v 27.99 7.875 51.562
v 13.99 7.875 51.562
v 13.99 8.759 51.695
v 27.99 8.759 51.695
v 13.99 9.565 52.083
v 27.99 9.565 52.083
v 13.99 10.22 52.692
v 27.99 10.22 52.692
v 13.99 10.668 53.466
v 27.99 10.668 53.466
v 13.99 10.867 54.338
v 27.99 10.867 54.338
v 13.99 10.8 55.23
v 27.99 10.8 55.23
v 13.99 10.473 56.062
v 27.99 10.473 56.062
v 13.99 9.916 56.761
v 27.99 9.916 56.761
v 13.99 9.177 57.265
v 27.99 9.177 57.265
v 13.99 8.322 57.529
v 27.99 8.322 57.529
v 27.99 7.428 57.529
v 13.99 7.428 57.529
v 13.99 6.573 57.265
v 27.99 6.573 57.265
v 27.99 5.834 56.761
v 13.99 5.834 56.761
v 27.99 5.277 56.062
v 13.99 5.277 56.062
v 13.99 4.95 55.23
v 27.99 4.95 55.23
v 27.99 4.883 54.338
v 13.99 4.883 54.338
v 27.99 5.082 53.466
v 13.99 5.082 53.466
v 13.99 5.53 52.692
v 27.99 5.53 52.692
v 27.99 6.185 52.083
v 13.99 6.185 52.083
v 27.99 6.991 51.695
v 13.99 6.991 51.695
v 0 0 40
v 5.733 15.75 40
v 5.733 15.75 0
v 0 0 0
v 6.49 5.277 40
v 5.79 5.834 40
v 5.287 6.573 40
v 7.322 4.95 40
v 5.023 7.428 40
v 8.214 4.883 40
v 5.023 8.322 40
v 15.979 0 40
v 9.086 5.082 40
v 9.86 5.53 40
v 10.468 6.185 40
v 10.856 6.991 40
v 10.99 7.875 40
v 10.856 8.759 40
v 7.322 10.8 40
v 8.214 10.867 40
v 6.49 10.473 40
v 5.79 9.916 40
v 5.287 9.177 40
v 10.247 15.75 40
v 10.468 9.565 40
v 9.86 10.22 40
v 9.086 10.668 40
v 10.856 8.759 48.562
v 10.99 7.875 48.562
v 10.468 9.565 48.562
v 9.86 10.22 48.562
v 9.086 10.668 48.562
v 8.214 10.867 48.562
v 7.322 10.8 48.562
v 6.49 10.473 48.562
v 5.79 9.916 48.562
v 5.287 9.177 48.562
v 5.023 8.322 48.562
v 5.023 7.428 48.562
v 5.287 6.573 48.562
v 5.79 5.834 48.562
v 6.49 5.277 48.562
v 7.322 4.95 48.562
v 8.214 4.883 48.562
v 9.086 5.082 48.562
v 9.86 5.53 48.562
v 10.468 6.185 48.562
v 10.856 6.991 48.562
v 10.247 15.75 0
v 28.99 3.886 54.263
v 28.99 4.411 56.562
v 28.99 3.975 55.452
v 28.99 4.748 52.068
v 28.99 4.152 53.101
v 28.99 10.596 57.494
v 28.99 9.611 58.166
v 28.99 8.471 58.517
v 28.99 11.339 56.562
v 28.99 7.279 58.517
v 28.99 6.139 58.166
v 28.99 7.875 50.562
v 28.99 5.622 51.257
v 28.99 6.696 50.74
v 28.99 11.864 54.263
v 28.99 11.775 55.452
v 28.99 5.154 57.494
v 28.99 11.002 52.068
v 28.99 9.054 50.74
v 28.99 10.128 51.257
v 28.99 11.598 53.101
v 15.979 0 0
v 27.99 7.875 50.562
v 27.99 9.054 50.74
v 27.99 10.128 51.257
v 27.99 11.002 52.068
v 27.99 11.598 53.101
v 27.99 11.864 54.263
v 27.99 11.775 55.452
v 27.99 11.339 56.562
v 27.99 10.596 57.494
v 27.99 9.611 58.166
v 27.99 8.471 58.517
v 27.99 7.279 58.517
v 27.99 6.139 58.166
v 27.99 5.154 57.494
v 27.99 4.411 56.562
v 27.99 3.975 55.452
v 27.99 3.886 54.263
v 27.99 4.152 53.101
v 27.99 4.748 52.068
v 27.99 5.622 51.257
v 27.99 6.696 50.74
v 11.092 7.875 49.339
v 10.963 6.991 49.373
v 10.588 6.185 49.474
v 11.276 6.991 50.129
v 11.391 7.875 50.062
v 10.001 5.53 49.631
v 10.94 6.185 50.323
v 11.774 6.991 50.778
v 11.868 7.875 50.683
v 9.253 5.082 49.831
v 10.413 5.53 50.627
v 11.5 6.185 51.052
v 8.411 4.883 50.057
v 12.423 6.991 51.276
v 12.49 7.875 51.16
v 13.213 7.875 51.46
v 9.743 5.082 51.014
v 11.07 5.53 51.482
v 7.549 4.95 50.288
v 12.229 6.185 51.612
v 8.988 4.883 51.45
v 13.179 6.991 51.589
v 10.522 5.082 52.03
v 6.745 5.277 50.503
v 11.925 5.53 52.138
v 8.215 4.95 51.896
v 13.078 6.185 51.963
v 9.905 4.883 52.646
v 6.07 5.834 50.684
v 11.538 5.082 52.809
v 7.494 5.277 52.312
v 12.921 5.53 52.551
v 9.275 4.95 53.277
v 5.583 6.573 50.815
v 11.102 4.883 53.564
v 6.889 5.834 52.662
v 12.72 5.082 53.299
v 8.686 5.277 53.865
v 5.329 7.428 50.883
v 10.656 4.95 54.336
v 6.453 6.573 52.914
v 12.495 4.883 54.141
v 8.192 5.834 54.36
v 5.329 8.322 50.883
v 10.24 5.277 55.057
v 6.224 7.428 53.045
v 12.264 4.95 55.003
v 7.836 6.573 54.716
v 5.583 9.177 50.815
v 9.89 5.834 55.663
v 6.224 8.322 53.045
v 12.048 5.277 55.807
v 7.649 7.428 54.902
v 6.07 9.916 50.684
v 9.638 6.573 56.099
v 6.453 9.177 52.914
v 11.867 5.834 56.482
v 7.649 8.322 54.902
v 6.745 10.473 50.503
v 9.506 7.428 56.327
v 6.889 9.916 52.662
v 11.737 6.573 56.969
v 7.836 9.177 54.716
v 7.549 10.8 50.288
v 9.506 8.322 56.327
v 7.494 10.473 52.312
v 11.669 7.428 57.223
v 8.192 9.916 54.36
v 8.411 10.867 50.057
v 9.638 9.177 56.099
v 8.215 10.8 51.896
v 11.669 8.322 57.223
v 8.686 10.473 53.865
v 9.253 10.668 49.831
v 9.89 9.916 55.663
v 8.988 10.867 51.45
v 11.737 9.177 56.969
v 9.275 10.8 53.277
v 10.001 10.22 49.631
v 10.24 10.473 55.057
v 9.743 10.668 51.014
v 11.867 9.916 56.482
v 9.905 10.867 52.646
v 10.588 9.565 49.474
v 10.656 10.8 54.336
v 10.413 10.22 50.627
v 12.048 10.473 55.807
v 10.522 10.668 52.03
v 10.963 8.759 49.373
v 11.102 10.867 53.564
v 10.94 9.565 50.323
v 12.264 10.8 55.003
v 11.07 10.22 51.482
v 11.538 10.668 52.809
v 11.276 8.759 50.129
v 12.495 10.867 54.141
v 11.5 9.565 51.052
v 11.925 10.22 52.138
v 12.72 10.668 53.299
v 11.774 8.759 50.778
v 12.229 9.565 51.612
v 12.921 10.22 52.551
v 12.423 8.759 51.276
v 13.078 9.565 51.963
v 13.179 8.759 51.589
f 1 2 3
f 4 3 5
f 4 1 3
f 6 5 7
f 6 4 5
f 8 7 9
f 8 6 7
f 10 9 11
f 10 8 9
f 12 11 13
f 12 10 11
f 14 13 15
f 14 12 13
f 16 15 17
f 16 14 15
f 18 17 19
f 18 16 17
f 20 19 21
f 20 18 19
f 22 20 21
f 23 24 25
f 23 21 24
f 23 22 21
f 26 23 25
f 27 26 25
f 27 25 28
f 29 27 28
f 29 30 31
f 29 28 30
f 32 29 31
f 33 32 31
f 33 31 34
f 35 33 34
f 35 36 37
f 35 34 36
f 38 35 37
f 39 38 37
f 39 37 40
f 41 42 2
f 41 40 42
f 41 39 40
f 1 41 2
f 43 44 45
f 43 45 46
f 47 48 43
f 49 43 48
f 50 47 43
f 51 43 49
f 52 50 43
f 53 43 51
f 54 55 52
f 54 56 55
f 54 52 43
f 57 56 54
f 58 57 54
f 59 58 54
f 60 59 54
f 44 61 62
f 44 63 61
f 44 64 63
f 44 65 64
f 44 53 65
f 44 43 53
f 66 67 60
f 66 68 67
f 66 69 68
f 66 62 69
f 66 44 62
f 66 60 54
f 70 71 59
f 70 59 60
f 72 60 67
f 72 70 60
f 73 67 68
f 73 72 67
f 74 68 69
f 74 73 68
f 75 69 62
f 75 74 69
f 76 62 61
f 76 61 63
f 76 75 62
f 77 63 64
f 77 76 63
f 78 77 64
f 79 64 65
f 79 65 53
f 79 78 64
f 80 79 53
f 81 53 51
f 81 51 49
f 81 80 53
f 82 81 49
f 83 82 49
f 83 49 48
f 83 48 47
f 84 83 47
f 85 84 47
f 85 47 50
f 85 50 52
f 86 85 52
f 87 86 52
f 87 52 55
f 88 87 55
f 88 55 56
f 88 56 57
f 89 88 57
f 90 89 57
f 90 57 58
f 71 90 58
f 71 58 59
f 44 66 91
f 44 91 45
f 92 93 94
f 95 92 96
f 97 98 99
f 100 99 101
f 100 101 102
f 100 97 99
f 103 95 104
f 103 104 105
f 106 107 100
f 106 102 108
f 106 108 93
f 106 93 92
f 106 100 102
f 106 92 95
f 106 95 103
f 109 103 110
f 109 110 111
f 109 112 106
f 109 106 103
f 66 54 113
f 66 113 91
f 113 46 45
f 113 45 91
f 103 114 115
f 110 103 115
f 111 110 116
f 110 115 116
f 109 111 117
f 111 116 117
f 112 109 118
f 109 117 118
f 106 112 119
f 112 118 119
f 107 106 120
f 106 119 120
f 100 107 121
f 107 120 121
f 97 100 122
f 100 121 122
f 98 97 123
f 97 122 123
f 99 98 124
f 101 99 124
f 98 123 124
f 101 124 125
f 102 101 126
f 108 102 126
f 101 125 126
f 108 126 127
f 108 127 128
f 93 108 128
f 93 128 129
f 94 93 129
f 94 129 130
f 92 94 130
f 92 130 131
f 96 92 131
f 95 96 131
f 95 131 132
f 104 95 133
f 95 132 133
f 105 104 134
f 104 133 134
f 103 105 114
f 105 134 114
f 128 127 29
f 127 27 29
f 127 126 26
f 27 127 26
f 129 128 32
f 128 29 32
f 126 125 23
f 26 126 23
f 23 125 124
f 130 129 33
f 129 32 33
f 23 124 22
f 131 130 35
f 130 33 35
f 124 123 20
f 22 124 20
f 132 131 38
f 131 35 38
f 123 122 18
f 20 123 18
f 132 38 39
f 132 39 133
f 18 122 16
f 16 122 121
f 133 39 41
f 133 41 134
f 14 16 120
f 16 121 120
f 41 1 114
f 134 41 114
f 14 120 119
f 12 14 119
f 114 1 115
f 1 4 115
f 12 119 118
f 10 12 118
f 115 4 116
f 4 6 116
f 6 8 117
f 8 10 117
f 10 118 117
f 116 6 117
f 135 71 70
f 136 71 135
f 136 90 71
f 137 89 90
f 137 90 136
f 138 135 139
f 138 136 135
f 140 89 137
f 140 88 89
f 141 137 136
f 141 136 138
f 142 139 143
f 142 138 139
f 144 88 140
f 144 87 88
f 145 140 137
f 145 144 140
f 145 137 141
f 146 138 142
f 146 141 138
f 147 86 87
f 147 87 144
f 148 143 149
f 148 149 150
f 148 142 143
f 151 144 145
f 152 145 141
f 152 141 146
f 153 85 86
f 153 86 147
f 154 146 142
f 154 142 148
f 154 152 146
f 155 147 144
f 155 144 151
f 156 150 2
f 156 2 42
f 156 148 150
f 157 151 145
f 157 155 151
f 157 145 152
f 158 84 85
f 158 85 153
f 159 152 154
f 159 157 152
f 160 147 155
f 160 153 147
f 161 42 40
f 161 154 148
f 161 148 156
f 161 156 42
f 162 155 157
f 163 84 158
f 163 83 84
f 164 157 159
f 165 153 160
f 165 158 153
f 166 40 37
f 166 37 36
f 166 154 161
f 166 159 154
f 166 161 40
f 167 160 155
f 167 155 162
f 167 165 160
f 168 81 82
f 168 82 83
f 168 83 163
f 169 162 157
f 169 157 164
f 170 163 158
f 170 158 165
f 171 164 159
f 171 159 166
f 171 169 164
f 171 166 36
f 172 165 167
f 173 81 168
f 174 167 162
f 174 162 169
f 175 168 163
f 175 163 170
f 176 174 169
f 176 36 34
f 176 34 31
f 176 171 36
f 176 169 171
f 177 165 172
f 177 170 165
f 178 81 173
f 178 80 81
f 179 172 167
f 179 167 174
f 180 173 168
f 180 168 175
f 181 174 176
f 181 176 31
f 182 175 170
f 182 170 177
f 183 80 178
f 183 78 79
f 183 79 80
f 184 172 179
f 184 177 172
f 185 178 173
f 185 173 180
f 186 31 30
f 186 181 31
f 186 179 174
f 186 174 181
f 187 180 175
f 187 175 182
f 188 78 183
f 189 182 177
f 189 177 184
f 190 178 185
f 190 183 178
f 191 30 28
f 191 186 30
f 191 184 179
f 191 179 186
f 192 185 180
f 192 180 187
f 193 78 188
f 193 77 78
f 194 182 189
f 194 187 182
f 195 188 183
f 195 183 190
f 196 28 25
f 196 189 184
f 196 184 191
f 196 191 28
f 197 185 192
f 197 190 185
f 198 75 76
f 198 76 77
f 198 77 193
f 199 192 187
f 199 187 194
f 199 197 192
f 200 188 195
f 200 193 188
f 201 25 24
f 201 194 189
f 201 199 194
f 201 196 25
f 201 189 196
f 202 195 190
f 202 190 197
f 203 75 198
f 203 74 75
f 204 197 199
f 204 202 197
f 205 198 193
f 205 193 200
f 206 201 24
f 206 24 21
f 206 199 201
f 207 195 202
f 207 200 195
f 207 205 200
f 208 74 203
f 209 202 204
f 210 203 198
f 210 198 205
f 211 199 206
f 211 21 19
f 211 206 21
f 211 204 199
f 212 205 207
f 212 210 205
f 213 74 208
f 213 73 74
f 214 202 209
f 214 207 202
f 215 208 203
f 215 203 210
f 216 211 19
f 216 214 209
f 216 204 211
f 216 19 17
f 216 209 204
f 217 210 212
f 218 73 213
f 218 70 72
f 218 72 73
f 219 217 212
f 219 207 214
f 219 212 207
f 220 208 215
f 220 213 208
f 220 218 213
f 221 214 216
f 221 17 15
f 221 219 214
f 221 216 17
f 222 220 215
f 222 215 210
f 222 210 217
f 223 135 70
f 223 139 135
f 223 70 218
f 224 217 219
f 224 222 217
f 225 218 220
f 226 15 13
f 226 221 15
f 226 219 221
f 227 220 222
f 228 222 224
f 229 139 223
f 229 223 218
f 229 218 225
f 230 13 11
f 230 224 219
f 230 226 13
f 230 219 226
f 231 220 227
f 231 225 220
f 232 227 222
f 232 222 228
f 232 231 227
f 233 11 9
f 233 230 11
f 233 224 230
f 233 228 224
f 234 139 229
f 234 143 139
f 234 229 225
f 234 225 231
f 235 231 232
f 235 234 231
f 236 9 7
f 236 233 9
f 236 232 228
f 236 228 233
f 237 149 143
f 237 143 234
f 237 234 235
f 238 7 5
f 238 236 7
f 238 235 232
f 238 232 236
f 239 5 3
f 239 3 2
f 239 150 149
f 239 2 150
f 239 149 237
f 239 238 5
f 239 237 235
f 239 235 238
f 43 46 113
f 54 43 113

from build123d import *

# Parameters (mm, degrees)
BOSS_EXTRUDE1_DEPTH = 40
SKETCH4_R           = 3
SKETCH5_R           = 4
BOSS_EXTRUDE2_DEPTH = 1


with BuildPart() as part:
    # Sketch1 → Boss-Extrude1 (new body)
    with BuildSketch(Plane.XY):
        Polygon((15.979053375, 0), (10.246522185, 15.75), (5.73253119, 15.75), (0, 0), align=None)
    extrude(amount=BOSS_EXTRUDE1_DEPTH)

    # Sweep1: sweep along a path in Sketch3
    with BuildLine(Plane(origin=(0, 7.875, 0), x_dir=(-1, 0, 0), z_dir=(0, -1, 0))) as sweep1_path:
        Line((-7.989526687, -40), (-7.989526687, -48.56216486))
        ThreePointArc((-7.989526687, -48.56216486), (-9.746886, -52.804805547), (-13.989526687, -54.56216486))
        Line((-13.989526687, -54.56216486), (-27.989526687, -54.56216486))
    # Sketch4 → Sweep1 (sweep)
    with BuildSketch(Plane(origin=(27.989526687, 0, 0), x_dir=(0, 0, -1), z_dir=(1, 0, 0))):
        with Locations((-54.56216486, 7.875)):
            Circle(SKETCH4_R)
    sweep(path=sweep1_path.line)

    # Sketch5 → Boss-Extrude2 (add)
    with BuildSketch(Plane(origin=(27.989526687, 0, 0), x_dir=(0, 0, -1), z_dir=(1, 0, 0))):
        with Locations((-54.56216486, 7.875)):
            Circle(SKETCH5_R)
    extrude(amount=BOSS_EXTRUDE2_DEPTH)


solid = part.part
